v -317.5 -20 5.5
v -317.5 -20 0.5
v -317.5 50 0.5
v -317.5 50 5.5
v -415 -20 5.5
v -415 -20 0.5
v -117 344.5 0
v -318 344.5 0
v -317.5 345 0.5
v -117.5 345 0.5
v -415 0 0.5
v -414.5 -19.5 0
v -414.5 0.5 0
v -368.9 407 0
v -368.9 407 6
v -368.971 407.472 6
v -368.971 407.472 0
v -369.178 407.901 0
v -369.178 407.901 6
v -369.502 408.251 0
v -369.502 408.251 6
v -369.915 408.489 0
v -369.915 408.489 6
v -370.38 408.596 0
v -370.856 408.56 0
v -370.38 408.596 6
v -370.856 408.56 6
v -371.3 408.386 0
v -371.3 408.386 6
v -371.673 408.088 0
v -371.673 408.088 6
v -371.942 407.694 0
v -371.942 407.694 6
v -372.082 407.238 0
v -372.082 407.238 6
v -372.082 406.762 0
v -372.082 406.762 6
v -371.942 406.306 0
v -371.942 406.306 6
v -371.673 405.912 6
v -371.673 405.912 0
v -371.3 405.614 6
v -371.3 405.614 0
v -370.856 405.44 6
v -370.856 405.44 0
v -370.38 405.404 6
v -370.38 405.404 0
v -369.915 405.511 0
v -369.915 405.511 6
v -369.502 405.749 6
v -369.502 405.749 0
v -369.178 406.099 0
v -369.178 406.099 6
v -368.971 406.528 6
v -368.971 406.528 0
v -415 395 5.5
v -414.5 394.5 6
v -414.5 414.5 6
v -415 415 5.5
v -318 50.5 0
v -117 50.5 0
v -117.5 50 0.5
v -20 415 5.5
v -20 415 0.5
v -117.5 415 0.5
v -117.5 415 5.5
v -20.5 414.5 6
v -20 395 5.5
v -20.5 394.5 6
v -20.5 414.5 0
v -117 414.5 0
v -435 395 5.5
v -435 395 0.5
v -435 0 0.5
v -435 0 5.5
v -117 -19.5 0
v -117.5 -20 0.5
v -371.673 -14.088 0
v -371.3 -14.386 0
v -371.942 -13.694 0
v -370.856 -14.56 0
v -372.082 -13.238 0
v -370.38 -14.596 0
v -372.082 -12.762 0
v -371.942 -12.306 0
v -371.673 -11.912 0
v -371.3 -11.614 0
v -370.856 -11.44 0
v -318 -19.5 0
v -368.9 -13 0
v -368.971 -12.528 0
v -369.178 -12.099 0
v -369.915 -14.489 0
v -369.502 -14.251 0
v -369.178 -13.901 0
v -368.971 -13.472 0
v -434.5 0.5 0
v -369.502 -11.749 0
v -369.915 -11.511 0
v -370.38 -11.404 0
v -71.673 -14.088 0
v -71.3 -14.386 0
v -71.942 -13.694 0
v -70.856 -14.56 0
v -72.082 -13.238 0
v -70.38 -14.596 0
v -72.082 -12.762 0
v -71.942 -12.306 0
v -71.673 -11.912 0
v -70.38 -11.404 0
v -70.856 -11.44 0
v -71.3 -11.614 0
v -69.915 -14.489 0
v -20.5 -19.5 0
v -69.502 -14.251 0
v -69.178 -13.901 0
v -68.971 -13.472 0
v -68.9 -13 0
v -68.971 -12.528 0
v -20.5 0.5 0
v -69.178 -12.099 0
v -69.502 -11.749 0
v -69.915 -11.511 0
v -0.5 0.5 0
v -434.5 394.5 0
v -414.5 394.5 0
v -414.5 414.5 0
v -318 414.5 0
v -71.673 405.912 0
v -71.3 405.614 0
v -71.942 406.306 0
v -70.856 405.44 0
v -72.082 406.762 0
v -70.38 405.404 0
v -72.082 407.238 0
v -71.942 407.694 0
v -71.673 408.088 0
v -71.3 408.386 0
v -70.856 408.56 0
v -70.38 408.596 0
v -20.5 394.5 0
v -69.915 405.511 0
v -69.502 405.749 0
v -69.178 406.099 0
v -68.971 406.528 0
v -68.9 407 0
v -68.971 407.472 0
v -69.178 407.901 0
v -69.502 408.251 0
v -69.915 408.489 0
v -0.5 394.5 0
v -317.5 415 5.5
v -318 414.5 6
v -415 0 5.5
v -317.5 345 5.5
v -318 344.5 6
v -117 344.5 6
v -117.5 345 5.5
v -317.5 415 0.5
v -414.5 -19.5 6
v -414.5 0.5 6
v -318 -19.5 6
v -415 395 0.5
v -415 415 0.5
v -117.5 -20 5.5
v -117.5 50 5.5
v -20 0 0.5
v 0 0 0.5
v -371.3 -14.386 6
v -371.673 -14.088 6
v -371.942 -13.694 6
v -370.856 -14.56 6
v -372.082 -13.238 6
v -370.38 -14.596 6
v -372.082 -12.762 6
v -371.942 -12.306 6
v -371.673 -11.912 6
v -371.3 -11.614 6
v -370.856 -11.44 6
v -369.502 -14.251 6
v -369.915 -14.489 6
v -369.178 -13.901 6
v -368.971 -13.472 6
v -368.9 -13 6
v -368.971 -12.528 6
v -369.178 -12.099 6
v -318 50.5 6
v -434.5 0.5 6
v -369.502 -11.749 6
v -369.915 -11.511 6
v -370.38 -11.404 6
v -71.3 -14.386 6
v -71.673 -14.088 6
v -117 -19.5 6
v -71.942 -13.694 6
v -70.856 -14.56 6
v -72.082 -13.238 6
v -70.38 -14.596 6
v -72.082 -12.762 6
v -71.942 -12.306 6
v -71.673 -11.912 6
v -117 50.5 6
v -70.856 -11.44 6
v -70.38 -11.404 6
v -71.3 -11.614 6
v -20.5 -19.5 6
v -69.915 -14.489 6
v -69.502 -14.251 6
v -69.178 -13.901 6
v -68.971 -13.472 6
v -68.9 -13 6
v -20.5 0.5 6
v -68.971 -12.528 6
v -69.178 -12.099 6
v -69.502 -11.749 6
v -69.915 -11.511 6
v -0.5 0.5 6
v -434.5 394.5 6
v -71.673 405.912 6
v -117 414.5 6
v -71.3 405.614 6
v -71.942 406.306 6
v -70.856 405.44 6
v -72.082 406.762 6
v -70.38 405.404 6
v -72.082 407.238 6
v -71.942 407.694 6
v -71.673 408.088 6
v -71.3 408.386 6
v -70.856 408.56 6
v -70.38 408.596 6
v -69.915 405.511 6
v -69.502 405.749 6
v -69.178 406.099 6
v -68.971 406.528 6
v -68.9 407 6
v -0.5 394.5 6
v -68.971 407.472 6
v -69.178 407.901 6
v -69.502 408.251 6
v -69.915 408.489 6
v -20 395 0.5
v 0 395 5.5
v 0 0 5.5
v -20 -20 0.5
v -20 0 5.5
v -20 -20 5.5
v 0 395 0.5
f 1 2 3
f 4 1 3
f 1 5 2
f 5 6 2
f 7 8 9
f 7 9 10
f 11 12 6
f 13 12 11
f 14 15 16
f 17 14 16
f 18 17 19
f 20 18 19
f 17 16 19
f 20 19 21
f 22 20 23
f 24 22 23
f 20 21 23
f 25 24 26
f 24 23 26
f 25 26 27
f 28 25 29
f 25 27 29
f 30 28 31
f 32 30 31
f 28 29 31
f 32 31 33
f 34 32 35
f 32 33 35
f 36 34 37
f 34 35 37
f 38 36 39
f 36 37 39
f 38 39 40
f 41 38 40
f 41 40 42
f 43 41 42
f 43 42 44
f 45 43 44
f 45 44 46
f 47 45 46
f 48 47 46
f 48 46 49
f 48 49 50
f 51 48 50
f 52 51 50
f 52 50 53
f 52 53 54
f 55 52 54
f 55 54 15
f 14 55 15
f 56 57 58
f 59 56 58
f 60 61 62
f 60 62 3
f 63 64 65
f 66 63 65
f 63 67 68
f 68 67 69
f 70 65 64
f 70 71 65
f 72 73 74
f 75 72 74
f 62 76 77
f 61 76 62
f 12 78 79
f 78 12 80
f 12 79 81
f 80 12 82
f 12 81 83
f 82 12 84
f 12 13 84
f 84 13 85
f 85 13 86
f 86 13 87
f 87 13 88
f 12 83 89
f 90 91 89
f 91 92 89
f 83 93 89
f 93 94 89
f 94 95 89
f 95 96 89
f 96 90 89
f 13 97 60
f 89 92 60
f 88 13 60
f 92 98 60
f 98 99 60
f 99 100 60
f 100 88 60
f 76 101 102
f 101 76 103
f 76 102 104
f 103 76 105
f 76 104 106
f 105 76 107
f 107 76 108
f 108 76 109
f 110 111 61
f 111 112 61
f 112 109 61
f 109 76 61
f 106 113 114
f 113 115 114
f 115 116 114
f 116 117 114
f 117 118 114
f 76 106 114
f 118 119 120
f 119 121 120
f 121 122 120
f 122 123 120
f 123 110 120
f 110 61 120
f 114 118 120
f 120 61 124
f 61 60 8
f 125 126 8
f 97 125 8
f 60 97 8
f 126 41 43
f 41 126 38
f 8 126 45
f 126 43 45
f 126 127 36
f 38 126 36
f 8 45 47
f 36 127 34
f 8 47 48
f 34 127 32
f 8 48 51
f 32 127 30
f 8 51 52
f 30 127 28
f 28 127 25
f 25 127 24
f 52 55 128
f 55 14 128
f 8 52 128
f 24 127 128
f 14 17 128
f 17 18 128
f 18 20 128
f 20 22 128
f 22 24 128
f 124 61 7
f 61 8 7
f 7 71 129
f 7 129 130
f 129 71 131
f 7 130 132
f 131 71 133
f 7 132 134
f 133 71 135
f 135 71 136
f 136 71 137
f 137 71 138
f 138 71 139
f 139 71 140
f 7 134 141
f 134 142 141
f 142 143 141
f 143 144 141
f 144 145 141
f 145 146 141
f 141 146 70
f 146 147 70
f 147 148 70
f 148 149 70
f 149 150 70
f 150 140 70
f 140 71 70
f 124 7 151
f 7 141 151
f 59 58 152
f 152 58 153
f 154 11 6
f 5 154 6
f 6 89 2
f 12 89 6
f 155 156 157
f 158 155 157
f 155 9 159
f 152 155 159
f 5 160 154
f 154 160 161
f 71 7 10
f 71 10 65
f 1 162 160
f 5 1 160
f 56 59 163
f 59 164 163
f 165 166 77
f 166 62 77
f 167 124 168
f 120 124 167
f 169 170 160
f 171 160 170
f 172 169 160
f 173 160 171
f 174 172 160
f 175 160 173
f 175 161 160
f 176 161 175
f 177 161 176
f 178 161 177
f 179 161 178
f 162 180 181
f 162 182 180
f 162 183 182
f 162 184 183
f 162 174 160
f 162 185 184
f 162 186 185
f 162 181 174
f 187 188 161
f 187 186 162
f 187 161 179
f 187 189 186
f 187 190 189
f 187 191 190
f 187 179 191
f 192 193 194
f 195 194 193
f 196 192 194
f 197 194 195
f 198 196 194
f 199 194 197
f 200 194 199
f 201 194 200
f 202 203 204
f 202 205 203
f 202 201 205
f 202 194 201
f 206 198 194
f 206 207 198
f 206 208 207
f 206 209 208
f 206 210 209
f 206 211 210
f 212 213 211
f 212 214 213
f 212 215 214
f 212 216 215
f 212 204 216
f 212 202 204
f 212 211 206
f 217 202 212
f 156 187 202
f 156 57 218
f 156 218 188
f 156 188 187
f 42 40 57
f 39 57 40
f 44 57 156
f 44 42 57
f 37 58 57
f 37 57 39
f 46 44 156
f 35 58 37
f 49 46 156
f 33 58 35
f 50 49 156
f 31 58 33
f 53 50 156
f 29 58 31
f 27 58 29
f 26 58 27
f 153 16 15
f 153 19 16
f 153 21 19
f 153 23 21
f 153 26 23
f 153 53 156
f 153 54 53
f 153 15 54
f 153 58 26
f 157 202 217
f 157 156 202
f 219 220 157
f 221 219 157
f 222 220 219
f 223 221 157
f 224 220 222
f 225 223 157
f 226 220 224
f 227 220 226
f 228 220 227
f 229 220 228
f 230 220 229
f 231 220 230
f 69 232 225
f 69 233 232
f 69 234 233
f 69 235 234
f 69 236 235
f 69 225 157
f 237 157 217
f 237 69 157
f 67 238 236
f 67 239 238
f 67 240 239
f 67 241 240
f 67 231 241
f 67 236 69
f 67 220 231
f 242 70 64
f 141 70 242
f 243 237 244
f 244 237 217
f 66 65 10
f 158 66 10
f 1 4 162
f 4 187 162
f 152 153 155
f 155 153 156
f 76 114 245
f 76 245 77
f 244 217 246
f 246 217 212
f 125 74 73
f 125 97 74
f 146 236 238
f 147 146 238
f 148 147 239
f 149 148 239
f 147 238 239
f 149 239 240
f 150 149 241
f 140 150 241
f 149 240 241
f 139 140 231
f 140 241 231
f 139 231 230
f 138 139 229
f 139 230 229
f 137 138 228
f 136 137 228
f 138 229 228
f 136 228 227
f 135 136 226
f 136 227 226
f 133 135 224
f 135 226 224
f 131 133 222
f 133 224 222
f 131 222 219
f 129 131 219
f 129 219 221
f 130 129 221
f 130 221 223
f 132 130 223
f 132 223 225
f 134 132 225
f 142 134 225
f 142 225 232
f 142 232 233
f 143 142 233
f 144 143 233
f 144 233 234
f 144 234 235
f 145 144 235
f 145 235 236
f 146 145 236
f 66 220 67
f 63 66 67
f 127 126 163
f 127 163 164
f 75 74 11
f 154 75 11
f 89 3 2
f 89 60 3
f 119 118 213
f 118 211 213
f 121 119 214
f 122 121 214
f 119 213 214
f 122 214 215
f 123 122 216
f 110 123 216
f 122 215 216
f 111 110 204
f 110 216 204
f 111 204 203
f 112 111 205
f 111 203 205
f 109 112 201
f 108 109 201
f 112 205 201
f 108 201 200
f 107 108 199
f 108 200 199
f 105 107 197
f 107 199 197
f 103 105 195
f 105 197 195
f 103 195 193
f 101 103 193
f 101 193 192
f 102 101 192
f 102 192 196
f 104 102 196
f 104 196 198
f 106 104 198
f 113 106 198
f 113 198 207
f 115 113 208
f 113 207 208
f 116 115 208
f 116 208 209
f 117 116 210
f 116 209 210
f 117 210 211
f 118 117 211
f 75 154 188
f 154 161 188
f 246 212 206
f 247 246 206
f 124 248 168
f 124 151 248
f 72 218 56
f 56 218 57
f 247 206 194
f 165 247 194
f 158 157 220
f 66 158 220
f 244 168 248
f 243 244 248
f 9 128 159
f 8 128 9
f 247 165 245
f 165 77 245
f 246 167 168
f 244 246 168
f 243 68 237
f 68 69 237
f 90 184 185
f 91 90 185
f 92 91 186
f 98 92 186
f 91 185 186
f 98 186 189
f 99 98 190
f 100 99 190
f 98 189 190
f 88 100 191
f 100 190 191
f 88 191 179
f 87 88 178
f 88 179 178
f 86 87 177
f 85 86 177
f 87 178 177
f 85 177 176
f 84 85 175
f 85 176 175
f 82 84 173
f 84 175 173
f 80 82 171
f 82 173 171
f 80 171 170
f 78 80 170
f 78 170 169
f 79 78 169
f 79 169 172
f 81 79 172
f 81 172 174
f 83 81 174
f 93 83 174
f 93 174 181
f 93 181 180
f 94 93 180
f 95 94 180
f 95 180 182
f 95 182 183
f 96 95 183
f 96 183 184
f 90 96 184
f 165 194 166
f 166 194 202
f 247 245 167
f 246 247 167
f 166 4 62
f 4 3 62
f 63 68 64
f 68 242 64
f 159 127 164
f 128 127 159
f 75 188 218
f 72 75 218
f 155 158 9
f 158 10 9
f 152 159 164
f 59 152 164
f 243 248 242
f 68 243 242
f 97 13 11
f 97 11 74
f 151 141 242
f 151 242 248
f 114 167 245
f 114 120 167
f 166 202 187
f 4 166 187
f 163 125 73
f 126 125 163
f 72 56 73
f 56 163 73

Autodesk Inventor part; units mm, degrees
ref_plane "YZ Plane" through (0, 0, 0) normal (1, 0, 0) x (0, 1, 0)
ref_plane "XZ Plane" through (0, 0, 0) normal (0, 1, 0) x (-1, 0, 0)
ref_plane "XY Plane" through (0, 0, 0) normal (0, 0, 1) x (1, 0, 0)
sketch "Skizze1" plane through (0, 0, 0) normal (0, 0, 1) x (1, 0, 0)
  line L0 (0, 0) -> (0, 395)
  line L1 (0, 395) -> (-20, 395)
  line L2 (-20, 395) -> (-20, 415)
  line L3 (-20, 415) -> (-117.5, 415)
  line L4 (-117.5, 415) -> (-117.5, 345)
  line L5 (-117.5, 345) -> (-317.5, 345)
  line L6 (-317.5, 345) -> (-317.5, 415)
  line L7 (-317.5, 415) -> (-415, 415)
  line L8 (-415, 415) -> (-415, 395)
  line L9 (-415, 395) -> (-435, 395)
  line L10 (-435, 395) -> (-435, 0)
  line L11 (-435, 0) -> (-415, 0)
  line L12 (-415, 0) -> (-415, -20)
  line L13 (-415, 0) -> (-395, 0) construction
  line L14 (-415, -20) -> (-317.5, -20)
  line L15 (-317.5, -20) -> (-317.5, 50)
  line L16 (-317.5, 50) -> (-117.5, 50)
  line L17 (-117.5, 50) -> (-117.5, -20)
  line L18 (-117.5, -20) -> (-20, -20)
  line L19 (-20, -20) -> (-20, 0)
  line L20 (-20, 0) -> (0, 0)
  dimension "d0" = 395
  dimension "d1" = 20
  dimension "d2" = 20
  dimension "d3" = 97.5
  dimension "d4" = 90
  dimension "d5" = 70
  dimension "d6" = 90
  dimension "d7" = 200
  dimension "d8" = 70
  dimension "d9" = 90
  dimension "d10" = 97.5
  dimension "d11" = 20
  dimension "d12" = 90
  dimension "d13" = 20
  dimension "d14" = 90
  dimension "d15" = 395
  dimension "d16" = 90
  dimension "d17" = 20
  dimension "d18" = 20
  dimension "d19" = 90
  dimension "d20" = 70
  dimension "d21" = 90
extrude "Extrusion1" add sketch "Skizze1" along normal blind 6
chamfer "Fase1" distance 0.5 angle 45 40 edges at (0, 197.5, 6) (-10, 0, 6) (-20, -10, 6) (-68.75, -20, 6) (-117.5, 15, 6) (-217.5, 50, 6) (-317.5, 15, 6) (-366.25, -20, 6) (-415, -10, 6) (-425, 0, 6) (-435, 197.5, 6) (-425, 395, 6) (-366.25, 415, 6) (-415, 405, 6) (-317.5, 380, 6) (-217.5, 345, 6) (-117.5, 380, 6) (-68.75, 415, 6) (-20, 405, 6) (-10, 395, 6) (-425, 0, 0) (-415, -10, 0) (-435, 197.5, 0) (-366.25, -20, 0) (-217.5, 50, 0) (-317.5, 15, 0) (-117.5, 15, 0) (-68.75, -20, 0) (-20, -10, 0) (-10, 0, 0) (0, 197.5, 0) (-10, 395, 0) (-20, 405, 0) (-68.75, 415, 0) (-117.5, 380, 0) (-217.5, 345, 0) (-317.5, 380, 0) (-425, 395, 0) (-415, 405, 0) (-366.25, 415, 0)
sketch "Skizze2" plane through (0, 0, 6) normal (0, 0, 1) x (1, 0, 0)
  circle A0 centre (-70.5, 407) radius 1.6
  line L0 (-117, 414.5) -> (-20.5, 414.5) projected
  line L1 (-20.5, 414.5) -> (-20.5, 394.5) projected
  circle A1 centre (-370.5, 407) radius 1.6
  circle A2 centre (-70.5, -13) radius 1.6
  circle A3 centre (-370.5, -13) radius 1.6
  point P0 (0, 0)
  dimension "d27" = 3.2
  dimension "d28" = 7.5
  dimension "d29" = 50
  dimension "d32" = 300
  dimension "d35" = 420
extrude "Extrusion2" cut sketch "Skizze2" against normal through all
properties part number "middle plate" material "Birke"
